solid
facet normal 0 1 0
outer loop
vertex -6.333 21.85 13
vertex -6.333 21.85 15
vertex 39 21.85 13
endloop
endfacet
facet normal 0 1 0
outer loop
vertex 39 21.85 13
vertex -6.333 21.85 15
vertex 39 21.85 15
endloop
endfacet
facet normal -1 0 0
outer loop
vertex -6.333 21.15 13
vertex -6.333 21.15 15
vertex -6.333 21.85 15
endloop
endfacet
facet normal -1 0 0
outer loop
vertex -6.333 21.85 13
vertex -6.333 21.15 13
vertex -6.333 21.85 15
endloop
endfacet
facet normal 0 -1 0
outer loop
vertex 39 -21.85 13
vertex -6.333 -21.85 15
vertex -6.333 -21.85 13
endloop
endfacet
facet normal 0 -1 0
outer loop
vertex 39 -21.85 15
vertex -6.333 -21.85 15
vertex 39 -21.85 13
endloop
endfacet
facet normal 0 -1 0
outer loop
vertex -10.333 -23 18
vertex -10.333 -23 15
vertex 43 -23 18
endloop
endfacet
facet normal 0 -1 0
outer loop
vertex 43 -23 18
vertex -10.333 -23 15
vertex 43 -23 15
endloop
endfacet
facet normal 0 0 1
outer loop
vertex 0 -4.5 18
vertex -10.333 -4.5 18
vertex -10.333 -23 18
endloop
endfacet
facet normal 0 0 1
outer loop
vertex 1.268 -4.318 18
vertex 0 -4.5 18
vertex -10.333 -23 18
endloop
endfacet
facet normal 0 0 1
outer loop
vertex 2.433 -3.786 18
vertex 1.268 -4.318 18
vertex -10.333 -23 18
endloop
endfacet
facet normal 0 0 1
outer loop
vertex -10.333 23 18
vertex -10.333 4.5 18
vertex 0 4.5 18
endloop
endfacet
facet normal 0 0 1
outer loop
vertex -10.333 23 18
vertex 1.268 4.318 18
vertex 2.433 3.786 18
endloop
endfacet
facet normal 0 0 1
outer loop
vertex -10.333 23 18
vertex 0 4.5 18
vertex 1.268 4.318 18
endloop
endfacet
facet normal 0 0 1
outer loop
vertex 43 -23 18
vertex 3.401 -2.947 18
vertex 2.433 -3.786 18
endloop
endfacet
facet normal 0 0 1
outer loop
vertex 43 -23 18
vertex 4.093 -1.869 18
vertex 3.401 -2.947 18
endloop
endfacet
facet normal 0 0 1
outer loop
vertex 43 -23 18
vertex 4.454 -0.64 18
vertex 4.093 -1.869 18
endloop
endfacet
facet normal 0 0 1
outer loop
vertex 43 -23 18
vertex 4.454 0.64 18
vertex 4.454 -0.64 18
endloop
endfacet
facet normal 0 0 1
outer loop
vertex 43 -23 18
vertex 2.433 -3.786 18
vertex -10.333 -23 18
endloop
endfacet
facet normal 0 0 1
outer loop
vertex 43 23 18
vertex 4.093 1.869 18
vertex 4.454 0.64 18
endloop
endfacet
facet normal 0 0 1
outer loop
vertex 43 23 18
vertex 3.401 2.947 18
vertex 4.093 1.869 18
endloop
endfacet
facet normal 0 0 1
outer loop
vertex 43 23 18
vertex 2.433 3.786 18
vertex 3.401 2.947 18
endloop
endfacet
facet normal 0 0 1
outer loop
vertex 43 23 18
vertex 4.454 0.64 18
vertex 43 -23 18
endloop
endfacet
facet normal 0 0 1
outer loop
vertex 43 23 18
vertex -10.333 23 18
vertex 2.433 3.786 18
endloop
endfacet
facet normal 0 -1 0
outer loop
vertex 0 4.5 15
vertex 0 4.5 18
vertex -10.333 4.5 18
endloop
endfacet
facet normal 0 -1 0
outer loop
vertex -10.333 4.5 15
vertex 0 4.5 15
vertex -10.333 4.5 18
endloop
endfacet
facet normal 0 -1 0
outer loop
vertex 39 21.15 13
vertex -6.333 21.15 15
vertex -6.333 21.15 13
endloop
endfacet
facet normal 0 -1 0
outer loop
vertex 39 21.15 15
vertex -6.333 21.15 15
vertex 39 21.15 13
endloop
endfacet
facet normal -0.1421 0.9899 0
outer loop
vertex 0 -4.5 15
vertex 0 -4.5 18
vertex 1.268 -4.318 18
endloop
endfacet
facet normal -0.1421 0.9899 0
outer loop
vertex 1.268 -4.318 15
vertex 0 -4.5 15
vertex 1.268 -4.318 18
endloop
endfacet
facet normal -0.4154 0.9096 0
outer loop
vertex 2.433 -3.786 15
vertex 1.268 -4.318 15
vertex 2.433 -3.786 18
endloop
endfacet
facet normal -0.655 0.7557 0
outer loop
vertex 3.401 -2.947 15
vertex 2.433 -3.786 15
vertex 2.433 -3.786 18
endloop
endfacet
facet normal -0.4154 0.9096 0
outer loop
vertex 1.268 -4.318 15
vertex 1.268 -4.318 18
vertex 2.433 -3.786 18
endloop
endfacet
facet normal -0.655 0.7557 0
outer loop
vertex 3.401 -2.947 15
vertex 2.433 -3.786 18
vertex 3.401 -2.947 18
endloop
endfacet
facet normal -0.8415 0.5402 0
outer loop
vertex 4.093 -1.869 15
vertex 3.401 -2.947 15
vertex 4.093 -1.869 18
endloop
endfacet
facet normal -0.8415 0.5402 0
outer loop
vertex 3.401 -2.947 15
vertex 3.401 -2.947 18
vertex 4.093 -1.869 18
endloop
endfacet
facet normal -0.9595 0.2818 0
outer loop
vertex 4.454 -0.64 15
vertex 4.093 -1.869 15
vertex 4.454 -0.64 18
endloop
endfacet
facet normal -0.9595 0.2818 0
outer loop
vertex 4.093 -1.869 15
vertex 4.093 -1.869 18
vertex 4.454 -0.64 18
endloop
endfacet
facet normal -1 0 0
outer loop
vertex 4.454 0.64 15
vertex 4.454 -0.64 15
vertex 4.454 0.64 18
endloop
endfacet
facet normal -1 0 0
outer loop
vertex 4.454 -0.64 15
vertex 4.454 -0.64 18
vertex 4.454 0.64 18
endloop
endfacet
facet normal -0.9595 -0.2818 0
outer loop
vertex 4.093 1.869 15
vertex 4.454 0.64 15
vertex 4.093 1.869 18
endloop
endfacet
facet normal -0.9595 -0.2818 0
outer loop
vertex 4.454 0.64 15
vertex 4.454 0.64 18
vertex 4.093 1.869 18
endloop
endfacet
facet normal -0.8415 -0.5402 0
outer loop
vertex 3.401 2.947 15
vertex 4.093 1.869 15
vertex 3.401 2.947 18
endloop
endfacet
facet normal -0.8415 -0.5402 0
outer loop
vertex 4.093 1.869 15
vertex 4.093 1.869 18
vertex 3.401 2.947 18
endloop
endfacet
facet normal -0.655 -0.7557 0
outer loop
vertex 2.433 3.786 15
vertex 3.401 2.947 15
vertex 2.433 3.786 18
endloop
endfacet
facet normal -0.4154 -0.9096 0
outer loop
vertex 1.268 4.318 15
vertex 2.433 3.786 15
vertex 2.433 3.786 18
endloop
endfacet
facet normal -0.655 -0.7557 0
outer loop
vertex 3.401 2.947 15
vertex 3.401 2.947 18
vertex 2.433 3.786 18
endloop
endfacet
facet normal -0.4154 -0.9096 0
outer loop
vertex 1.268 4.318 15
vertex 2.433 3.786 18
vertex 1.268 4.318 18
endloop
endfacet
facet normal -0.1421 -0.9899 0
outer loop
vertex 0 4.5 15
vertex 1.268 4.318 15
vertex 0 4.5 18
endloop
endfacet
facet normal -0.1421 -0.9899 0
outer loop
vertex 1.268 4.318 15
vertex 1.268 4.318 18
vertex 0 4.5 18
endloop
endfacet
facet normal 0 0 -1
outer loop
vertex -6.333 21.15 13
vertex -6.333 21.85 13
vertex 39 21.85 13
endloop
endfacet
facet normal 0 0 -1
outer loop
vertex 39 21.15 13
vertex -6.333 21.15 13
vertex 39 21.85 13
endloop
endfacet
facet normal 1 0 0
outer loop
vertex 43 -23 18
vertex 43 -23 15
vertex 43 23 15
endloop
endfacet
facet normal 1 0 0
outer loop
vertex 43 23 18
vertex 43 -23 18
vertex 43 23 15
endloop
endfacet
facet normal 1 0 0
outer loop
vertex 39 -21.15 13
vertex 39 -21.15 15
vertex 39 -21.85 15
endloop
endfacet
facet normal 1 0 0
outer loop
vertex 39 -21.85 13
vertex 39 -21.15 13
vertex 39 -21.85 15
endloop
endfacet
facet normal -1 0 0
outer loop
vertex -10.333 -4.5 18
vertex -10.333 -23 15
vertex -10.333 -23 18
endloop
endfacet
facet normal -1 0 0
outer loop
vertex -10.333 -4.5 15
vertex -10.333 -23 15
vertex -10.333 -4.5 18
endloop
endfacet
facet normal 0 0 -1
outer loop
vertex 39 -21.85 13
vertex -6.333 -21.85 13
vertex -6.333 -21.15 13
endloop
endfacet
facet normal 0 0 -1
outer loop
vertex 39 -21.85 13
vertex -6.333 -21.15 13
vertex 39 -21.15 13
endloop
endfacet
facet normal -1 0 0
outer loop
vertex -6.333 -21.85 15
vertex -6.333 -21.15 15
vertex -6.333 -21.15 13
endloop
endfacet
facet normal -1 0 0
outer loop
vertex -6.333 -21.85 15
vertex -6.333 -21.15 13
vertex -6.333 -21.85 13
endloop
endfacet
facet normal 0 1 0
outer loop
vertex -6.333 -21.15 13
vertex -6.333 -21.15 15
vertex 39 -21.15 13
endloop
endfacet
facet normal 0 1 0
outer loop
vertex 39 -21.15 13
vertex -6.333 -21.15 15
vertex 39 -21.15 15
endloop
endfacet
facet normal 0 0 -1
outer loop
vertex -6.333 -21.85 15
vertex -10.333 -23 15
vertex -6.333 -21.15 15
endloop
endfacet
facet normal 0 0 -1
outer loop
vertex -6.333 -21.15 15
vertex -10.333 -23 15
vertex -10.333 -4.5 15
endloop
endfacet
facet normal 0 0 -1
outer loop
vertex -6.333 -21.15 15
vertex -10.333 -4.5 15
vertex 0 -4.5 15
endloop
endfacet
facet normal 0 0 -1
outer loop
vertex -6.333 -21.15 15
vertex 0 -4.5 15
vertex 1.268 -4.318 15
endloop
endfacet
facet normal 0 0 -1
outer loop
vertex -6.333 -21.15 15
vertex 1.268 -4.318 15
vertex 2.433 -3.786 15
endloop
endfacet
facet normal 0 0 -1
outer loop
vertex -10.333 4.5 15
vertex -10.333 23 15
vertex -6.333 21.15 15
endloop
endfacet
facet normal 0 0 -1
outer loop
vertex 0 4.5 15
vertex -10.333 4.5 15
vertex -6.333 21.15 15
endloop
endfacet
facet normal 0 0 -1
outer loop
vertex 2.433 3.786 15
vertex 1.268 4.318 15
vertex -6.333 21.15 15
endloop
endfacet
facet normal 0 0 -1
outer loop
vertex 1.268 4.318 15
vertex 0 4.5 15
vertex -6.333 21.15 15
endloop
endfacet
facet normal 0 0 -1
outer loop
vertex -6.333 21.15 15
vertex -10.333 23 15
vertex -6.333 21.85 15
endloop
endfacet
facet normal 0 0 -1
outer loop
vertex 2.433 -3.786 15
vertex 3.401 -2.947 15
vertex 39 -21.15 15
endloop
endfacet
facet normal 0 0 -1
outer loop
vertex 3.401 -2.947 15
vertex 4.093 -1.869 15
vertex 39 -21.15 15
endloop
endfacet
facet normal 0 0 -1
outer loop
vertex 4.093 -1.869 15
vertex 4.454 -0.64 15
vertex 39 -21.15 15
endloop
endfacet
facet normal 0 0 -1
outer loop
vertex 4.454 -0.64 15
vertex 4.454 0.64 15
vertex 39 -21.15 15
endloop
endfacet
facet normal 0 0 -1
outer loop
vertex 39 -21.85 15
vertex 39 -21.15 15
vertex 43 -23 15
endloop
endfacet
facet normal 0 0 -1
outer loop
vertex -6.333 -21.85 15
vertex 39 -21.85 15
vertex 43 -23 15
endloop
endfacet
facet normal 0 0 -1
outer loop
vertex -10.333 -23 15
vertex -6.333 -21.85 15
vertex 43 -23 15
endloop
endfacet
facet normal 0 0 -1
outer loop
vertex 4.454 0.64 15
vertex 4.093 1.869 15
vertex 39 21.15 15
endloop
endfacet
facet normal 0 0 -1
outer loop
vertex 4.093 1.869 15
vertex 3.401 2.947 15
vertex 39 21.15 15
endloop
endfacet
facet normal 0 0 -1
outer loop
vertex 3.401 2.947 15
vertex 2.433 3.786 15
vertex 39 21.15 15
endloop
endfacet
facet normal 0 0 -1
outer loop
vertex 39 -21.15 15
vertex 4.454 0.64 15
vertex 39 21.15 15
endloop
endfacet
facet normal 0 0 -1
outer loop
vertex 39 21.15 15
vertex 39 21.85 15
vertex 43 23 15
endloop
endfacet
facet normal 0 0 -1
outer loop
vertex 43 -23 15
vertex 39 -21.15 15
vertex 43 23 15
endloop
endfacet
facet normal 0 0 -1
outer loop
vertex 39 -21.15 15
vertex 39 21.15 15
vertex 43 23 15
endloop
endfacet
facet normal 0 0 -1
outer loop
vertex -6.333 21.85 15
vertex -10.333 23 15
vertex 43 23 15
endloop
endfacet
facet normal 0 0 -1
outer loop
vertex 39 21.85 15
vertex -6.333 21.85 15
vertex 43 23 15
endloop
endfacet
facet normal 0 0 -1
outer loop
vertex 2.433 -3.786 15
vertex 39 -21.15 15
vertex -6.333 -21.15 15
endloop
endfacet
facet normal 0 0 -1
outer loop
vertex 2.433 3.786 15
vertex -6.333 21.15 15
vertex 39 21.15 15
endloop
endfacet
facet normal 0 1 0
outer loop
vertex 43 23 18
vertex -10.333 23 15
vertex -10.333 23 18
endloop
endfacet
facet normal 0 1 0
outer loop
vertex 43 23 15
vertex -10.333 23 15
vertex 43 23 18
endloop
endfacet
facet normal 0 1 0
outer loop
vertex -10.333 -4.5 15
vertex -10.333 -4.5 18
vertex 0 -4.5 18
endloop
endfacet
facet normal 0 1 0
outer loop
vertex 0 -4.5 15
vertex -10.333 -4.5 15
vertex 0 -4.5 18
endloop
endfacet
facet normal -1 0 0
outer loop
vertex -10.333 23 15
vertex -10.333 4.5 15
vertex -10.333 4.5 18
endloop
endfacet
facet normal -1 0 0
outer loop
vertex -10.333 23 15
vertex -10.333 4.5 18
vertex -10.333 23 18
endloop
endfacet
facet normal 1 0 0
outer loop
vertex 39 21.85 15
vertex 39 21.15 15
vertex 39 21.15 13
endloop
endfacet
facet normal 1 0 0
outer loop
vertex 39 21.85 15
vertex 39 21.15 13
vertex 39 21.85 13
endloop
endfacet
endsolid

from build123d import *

# Parameters (mm, degrees)
SKETCH008_W     = 53.333333
SKETCH008_H     = 46
PAD005_DEPTH    = 3
SKETCH010_W     = 45.333333
SKETCH010_H     = 0.7
PAD006_DEPTH    = 2
POCKET005_DEPTH = 3


with BuildPart() as part:
    # Sketch008 → Pad005 (new body)
    with BuildSketch(Plane.XY.offset(15)):
        with Locations((16.333334, 0)):
            Rectangle(SKETCH008_W, SKETCH008_H)
    extrude(amount=PAD005_DEPTH)

    # Sketch010 → Pad006 (join)
    with BuildSketch(Plane(origin=(0, 0, 15), x_dir=(1, 0, 0), z_dir=(0, 0, -1))):
        with Locations((16.333334, 21.5)):
            Rectangle(SKETCH010_W, SKETCH010_H)
    pad006 = extrude(amount=PAD006_DEPTH)

    # Mirrored001: Pad006 across XZ
    add(pad006.mirror(Plane.XZ))

    # Sketch009 (on Face6 of Pad005) → Pocket005 (cut)
    with BuildSketch(Plane.XY.offset(18)):
        with BuildLine():
            ThreePointArc((0, -4.5), (4.5, 0), (0, 4.5))
            Line((0, 4.5), (-10.333333, 4.5))
            Line((-10.333333, 4.5), (-10.333333, -4.5))
            Line((-10.333333, -4.5), (0, -4.5))
        make_face()
    extrude(amount=-POCKET005_DEPTH, mode=Mode.SUBTRACT)


solid = part.part
